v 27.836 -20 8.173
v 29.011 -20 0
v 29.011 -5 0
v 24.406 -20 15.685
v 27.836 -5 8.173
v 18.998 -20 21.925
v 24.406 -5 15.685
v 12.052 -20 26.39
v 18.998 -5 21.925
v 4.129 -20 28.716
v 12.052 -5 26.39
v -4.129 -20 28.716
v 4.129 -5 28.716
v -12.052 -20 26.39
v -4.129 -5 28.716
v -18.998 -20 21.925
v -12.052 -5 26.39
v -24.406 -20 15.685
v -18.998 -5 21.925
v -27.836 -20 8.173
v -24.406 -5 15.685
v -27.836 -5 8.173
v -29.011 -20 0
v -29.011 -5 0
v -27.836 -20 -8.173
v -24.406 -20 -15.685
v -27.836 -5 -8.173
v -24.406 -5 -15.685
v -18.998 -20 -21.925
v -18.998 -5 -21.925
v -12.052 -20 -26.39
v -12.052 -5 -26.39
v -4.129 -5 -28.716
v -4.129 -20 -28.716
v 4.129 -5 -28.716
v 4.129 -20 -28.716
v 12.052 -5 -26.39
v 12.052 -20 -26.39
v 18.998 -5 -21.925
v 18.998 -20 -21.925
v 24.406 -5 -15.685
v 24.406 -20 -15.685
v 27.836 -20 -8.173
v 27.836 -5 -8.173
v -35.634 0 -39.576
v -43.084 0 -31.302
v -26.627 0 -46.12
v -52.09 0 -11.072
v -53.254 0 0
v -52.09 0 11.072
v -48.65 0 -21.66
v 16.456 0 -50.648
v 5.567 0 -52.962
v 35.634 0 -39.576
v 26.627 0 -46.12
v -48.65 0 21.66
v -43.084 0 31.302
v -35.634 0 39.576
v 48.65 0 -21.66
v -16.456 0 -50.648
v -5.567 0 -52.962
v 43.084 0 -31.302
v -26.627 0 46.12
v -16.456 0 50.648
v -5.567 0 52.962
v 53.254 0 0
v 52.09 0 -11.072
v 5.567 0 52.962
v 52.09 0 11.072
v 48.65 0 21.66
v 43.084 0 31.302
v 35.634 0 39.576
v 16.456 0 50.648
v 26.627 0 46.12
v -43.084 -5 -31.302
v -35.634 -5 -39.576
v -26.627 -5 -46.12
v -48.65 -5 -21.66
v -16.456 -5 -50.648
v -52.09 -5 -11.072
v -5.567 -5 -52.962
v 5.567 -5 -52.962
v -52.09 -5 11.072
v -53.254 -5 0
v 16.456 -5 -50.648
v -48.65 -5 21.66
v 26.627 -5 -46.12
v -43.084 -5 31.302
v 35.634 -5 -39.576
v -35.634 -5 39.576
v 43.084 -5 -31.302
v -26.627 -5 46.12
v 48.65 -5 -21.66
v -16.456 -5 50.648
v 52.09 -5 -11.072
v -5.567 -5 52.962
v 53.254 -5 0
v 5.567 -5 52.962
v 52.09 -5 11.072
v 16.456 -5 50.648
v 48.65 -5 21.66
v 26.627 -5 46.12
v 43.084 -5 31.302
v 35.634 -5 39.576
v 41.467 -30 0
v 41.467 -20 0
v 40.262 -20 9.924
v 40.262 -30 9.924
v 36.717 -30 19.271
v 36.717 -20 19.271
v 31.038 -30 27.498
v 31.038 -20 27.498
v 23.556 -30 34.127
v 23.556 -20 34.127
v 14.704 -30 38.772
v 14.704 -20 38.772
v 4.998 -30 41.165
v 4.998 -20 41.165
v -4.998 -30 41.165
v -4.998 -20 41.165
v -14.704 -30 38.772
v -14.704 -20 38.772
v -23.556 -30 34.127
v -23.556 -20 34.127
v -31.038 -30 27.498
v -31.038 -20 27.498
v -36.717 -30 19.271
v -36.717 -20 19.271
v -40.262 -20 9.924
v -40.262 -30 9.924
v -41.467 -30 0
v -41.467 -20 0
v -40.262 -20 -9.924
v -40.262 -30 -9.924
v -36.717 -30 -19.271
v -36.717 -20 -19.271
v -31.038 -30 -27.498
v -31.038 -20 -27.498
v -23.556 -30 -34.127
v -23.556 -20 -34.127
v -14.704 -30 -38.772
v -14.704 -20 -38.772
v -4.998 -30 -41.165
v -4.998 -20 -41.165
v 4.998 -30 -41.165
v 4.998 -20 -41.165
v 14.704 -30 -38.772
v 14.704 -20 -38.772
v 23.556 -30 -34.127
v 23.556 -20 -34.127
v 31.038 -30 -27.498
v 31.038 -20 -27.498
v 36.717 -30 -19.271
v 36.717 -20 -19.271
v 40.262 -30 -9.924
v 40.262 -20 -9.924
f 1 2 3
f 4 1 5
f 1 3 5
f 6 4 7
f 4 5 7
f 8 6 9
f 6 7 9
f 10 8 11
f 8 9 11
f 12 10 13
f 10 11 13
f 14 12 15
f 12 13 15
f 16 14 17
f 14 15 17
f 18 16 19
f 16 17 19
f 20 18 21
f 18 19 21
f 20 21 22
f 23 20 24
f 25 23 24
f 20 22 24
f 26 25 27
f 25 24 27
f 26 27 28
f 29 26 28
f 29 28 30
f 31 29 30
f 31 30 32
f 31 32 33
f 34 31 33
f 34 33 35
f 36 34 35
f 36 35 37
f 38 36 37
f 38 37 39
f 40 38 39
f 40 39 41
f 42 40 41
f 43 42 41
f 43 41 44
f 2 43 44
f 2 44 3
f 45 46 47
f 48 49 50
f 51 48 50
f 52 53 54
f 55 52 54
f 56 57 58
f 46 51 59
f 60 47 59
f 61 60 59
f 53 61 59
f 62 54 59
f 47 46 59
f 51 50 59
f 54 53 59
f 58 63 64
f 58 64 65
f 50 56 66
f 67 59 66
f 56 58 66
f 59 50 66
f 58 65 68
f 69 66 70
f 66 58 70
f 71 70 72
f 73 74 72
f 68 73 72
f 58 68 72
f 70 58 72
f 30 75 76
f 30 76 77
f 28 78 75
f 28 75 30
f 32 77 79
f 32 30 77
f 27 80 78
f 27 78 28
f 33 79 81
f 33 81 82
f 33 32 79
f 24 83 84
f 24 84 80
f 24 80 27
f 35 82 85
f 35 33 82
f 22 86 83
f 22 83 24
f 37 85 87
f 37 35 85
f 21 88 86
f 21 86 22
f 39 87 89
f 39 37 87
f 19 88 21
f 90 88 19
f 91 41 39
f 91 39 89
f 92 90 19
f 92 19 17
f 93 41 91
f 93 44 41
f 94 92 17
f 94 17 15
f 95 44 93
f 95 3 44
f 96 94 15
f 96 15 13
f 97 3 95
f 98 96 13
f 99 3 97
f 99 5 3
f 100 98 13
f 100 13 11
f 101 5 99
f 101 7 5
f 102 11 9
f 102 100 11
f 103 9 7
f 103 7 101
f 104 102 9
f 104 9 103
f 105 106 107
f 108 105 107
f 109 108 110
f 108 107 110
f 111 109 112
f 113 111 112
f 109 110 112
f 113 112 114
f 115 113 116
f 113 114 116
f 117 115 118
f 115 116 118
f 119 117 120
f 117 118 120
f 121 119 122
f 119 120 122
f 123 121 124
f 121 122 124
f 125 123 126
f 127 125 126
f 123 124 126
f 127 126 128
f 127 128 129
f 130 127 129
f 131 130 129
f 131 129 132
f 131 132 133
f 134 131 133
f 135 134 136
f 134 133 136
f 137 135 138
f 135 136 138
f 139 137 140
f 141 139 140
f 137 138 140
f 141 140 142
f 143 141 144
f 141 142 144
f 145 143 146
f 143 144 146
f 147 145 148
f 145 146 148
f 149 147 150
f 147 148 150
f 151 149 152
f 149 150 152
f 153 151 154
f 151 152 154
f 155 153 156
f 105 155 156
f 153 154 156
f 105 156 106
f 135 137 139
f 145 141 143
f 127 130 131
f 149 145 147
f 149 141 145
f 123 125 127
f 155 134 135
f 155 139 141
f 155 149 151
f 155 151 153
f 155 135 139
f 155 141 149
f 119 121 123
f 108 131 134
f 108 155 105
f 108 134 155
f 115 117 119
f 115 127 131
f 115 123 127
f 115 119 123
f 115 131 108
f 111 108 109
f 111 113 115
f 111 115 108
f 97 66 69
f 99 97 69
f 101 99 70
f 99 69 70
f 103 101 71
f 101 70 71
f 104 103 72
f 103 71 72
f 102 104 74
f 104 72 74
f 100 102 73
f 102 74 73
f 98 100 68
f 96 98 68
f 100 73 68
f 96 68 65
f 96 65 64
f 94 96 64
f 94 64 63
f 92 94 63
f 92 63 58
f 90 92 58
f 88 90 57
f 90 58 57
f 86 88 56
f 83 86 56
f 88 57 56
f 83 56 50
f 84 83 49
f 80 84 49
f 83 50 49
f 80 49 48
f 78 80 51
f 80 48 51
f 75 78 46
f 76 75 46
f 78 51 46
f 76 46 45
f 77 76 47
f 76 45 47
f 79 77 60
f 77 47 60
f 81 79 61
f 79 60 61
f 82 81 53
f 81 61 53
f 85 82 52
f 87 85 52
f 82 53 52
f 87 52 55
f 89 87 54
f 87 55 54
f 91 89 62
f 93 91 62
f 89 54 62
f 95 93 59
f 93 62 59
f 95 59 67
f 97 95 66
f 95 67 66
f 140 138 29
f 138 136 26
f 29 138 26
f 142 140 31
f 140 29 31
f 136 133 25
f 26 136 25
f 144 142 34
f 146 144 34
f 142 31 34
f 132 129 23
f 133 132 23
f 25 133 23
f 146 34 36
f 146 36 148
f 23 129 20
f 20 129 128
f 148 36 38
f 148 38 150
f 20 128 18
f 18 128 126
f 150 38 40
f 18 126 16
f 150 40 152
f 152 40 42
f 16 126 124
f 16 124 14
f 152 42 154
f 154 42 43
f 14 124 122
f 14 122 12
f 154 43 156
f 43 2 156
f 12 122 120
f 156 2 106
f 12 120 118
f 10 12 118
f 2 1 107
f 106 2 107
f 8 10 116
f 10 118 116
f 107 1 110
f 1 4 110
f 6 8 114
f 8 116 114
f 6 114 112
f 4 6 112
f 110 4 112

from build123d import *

# Parameters (mm, degrees)
F0_R     = 53.254214
F1_DEPTH = 5
F2_R     = 29.011498
F3_DEPTH = 20
F4_R     = 41.466873
F5_DEPTH = 10


with BuildPart() as f1:
    # F0 (on Front) → F1 (new body)
    with BuildSketch(Plane.XZ):
        Circle(F0_R)
    extrude(amount=F1_DEPTH)

    # F2 (on Front) → F3 (join)
    with BuildSketch(Plane.XZ):
        Circle(F2_R)
    extrude(amount=F3_DEPTH)

    # F4 (on face) → F5 (join)
    with BuildSketch(Plane.XZ.offset(20)):
        Circle(F4_R)
    extrude(amount=F5_DEPTH)


solid = f1.part
